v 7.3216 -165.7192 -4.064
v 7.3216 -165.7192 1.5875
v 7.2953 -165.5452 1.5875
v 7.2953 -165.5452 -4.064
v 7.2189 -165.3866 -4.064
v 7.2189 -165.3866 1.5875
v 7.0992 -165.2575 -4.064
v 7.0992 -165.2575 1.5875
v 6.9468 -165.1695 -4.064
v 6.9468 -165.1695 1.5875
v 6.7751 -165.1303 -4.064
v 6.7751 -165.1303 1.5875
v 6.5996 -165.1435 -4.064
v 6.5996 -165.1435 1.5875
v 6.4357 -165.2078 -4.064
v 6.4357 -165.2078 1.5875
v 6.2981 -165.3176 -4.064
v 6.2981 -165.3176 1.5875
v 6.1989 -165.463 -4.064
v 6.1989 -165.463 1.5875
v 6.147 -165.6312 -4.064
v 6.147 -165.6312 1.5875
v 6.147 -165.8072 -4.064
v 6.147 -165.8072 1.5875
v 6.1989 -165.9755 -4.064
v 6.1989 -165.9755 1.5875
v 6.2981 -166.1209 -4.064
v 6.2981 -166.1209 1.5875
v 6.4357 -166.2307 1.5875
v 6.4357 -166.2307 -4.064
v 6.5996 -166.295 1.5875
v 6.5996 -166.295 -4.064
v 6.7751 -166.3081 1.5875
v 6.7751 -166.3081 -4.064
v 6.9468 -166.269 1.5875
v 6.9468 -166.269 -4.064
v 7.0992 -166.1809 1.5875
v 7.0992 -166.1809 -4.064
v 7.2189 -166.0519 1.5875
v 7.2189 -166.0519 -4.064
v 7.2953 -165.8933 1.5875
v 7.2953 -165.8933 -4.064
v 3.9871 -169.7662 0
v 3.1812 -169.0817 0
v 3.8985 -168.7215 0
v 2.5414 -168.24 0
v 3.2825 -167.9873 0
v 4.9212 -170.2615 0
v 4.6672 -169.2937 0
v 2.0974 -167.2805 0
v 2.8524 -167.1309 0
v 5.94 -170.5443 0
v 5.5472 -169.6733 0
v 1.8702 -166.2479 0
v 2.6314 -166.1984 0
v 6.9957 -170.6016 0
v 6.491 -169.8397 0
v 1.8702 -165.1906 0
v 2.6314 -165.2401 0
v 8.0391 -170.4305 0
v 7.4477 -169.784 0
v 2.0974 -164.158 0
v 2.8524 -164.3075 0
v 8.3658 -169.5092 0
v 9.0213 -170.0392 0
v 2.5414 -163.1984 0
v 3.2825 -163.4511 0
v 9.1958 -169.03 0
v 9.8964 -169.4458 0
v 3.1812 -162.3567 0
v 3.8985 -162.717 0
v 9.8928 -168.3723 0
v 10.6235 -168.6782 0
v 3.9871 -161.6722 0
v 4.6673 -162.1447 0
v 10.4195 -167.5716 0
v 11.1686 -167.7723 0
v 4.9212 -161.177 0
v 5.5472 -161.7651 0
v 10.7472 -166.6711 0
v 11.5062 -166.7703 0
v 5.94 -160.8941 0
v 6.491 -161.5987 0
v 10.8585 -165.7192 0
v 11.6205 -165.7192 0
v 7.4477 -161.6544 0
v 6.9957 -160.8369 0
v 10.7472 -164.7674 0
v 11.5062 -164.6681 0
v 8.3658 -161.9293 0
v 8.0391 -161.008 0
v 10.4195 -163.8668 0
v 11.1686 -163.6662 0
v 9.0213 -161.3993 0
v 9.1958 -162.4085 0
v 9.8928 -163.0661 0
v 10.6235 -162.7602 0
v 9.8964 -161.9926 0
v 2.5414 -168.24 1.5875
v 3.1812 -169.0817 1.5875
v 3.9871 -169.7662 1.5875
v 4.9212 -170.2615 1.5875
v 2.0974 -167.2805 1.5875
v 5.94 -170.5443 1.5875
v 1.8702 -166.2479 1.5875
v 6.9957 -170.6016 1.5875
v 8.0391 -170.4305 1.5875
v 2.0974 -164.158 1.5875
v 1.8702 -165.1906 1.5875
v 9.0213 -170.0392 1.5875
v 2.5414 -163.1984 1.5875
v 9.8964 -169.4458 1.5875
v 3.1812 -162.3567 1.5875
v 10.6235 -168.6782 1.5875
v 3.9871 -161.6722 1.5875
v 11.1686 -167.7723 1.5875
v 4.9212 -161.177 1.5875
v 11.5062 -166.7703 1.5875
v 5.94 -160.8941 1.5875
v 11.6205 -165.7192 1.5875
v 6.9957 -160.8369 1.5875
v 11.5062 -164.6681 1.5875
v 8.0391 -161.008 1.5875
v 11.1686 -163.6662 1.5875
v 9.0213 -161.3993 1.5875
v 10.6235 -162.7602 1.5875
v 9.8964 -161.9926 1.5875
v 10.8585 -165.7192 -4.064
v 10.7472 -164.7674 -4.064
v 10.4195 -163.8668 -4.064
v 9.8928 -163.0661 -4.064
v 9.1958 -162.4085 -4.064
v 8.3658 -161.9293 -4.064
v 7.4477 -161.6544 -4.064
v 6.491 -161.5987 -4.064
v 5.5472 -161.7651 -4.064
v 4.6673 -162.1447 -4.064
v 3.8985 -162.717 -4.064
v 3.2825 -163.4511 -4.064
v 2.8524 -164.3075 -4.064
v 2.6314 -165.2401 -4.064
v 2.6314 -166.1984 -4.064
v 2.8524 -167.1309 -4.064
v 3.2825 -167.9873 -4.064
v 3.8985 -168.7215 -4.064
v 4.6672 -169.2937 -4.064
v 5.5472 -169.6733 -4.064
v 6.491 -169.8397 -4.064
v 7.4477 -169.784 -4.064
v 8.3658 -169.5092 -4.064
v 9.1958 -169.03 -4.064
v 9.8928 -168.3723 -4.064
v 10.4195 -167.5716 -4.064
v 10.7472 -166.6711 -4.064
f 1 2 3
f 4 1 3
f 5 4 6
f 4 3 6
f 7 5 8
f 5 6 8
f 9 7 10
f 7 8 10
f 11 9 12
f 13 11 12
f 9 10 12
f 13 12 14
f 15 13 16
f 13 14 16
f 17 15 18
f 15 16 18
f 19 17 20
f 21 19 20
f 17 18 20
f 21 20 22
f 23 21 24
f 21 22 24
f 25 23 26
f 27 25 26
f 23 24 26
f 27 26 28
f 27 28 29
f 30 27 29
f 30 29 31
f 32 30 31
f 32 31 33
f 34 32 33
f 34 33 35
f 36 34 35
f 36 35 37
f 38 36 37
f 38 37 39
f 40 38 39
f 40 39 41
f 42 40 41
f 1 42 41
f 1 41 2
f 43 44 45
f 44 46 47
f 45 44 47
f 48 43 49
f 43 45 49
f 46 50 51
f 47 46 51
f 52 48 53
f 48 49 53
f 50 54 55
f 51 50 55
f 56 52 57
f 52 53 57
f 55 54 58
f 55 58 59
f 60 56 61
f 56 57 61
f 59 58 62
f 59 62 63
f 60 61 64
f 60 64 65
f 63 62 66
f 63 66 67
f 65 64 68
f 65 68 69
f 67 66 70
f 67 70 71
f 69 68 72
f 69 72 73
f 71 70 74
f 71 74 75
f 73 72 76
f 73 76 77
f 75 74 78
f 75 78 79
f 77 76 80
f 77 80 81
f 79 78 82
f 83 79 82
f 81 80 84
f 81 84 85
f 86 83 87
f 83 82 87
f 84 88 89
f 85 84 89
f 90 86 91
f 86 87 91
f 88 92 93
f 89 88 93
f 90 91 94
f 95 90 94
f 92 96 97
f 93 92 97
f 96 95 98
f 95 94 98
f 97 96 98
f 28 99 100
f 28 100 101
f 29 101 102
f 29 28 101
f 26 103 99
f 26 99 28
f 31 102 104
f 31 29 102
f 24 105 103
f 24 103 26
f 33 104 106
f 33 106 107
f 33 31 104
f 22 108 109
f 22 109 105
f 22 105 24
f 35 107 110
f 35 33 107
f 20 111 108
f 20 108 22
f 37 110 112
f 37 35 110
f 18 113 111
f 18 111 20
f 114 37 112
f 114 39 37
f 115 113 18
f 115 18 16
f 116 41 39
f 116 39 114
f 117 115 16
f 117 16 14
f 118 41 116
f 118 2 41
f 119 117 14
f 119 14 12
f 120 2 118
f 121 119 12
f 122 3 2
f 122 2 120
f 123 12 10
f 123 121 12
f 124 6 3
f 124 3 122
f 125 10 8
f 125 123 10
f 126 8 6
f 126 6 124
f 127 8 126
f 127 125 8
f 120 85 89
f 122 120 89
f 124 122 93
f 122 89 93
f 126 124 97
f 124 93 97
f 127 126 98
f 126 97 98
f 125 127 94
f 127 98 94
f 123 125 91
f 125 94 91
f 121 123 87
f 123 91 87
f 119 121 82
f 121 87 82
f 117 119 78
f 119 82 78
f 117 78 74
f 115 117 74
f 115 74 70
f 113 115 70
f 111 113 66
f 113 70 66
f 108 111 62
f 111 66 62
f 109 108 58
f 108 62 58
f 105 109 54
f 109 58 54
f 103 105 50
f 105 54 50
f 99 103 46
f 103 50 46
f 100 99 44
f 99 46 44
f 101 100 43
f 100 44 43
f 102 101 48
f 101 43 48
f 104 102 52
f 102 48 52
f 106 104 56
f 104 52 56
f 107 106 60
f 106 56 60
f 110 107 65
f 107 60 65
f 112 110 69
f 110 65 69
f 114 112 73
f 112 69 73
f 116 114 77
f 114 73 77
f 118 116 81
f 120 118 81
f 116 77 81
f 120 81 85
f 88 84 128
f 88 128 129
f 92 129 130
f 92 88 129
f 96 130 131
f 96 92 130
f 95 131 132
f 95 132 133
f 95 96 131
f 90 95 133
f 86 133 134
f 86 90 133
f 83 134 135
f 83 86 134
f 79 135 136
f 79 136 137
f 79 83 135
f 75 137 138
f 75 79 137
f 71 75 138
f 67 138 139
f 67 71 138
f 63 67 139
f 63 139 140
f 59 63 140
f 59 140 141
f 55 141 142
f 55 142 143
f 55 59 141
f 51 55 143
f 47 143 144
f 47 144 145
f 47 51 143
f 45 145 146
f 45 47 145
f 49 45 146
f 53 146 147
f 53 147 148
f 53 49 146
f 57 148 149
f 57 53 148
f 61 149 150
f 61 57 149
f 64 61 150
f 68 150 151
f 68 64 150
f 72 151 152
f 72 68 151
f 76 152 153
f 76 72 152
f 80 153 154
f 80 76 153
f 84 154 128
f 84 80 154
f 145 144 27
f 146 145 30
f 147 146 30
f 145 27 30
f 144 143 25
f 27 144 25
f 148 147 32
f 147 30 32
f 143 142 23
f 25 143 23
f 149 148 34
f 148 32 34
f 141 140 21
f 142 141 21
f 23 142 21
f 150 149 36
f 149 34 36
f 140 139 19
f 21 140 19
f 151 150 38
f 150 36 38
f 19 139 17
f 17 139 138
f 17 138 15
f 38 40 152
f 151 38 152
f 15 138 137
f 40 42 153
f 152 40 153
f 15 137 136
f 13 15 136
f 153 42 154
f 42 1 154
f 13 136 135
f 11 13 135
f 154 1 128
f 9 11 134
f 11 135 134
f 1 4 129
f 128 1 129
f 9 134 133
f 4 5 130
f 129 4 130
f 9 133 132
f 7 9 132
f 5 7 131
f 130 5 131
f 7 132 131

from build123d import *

# Parameters (mm, degrees)
SKETCH1_R                    = 4.1275
BOSS_EXTRUDE2_DEPTH          = 4.064
SKETCH2_R                    = 4.8895
BOSS_EXTRUDE3_DEPTH          = 1.5875
F_56_0_0465_DIAMETER_HOLE1_D = 1.1811


with BuildPart() as part:
    # Sketch1 → Boss-Extrude2 (new body)
    with BuildSketch(Plane.XY):
        with Locations((6.731, -165.7192297)):
            Circle(SKETCH1_R)
    extrude(amount=-BOSS_EXTRUDE2_DEPTH)

    # Sketch2 → Boss-Extrude3 (add)
    with BuildSketch(Plane.XY):
        with Locations((6.731, -165.7192297)):
            Circle(SKETCH2_R)
    extrude(amount=BOSS_EXTRUDE3_DEPTH)

    # #56 (0.0465) Diameter Hole1 (through all)
    with Locations(Plane(origin=(0, 0, -4.064), x_dir=(-1, 0, 0), z_dir=(0, 0, -1))):
        with Locations((-6.731, -165.7192297)):
            Hole(F_56_0_0465_DIAMETER_HOLE1_D / 2)


solid = part.part
